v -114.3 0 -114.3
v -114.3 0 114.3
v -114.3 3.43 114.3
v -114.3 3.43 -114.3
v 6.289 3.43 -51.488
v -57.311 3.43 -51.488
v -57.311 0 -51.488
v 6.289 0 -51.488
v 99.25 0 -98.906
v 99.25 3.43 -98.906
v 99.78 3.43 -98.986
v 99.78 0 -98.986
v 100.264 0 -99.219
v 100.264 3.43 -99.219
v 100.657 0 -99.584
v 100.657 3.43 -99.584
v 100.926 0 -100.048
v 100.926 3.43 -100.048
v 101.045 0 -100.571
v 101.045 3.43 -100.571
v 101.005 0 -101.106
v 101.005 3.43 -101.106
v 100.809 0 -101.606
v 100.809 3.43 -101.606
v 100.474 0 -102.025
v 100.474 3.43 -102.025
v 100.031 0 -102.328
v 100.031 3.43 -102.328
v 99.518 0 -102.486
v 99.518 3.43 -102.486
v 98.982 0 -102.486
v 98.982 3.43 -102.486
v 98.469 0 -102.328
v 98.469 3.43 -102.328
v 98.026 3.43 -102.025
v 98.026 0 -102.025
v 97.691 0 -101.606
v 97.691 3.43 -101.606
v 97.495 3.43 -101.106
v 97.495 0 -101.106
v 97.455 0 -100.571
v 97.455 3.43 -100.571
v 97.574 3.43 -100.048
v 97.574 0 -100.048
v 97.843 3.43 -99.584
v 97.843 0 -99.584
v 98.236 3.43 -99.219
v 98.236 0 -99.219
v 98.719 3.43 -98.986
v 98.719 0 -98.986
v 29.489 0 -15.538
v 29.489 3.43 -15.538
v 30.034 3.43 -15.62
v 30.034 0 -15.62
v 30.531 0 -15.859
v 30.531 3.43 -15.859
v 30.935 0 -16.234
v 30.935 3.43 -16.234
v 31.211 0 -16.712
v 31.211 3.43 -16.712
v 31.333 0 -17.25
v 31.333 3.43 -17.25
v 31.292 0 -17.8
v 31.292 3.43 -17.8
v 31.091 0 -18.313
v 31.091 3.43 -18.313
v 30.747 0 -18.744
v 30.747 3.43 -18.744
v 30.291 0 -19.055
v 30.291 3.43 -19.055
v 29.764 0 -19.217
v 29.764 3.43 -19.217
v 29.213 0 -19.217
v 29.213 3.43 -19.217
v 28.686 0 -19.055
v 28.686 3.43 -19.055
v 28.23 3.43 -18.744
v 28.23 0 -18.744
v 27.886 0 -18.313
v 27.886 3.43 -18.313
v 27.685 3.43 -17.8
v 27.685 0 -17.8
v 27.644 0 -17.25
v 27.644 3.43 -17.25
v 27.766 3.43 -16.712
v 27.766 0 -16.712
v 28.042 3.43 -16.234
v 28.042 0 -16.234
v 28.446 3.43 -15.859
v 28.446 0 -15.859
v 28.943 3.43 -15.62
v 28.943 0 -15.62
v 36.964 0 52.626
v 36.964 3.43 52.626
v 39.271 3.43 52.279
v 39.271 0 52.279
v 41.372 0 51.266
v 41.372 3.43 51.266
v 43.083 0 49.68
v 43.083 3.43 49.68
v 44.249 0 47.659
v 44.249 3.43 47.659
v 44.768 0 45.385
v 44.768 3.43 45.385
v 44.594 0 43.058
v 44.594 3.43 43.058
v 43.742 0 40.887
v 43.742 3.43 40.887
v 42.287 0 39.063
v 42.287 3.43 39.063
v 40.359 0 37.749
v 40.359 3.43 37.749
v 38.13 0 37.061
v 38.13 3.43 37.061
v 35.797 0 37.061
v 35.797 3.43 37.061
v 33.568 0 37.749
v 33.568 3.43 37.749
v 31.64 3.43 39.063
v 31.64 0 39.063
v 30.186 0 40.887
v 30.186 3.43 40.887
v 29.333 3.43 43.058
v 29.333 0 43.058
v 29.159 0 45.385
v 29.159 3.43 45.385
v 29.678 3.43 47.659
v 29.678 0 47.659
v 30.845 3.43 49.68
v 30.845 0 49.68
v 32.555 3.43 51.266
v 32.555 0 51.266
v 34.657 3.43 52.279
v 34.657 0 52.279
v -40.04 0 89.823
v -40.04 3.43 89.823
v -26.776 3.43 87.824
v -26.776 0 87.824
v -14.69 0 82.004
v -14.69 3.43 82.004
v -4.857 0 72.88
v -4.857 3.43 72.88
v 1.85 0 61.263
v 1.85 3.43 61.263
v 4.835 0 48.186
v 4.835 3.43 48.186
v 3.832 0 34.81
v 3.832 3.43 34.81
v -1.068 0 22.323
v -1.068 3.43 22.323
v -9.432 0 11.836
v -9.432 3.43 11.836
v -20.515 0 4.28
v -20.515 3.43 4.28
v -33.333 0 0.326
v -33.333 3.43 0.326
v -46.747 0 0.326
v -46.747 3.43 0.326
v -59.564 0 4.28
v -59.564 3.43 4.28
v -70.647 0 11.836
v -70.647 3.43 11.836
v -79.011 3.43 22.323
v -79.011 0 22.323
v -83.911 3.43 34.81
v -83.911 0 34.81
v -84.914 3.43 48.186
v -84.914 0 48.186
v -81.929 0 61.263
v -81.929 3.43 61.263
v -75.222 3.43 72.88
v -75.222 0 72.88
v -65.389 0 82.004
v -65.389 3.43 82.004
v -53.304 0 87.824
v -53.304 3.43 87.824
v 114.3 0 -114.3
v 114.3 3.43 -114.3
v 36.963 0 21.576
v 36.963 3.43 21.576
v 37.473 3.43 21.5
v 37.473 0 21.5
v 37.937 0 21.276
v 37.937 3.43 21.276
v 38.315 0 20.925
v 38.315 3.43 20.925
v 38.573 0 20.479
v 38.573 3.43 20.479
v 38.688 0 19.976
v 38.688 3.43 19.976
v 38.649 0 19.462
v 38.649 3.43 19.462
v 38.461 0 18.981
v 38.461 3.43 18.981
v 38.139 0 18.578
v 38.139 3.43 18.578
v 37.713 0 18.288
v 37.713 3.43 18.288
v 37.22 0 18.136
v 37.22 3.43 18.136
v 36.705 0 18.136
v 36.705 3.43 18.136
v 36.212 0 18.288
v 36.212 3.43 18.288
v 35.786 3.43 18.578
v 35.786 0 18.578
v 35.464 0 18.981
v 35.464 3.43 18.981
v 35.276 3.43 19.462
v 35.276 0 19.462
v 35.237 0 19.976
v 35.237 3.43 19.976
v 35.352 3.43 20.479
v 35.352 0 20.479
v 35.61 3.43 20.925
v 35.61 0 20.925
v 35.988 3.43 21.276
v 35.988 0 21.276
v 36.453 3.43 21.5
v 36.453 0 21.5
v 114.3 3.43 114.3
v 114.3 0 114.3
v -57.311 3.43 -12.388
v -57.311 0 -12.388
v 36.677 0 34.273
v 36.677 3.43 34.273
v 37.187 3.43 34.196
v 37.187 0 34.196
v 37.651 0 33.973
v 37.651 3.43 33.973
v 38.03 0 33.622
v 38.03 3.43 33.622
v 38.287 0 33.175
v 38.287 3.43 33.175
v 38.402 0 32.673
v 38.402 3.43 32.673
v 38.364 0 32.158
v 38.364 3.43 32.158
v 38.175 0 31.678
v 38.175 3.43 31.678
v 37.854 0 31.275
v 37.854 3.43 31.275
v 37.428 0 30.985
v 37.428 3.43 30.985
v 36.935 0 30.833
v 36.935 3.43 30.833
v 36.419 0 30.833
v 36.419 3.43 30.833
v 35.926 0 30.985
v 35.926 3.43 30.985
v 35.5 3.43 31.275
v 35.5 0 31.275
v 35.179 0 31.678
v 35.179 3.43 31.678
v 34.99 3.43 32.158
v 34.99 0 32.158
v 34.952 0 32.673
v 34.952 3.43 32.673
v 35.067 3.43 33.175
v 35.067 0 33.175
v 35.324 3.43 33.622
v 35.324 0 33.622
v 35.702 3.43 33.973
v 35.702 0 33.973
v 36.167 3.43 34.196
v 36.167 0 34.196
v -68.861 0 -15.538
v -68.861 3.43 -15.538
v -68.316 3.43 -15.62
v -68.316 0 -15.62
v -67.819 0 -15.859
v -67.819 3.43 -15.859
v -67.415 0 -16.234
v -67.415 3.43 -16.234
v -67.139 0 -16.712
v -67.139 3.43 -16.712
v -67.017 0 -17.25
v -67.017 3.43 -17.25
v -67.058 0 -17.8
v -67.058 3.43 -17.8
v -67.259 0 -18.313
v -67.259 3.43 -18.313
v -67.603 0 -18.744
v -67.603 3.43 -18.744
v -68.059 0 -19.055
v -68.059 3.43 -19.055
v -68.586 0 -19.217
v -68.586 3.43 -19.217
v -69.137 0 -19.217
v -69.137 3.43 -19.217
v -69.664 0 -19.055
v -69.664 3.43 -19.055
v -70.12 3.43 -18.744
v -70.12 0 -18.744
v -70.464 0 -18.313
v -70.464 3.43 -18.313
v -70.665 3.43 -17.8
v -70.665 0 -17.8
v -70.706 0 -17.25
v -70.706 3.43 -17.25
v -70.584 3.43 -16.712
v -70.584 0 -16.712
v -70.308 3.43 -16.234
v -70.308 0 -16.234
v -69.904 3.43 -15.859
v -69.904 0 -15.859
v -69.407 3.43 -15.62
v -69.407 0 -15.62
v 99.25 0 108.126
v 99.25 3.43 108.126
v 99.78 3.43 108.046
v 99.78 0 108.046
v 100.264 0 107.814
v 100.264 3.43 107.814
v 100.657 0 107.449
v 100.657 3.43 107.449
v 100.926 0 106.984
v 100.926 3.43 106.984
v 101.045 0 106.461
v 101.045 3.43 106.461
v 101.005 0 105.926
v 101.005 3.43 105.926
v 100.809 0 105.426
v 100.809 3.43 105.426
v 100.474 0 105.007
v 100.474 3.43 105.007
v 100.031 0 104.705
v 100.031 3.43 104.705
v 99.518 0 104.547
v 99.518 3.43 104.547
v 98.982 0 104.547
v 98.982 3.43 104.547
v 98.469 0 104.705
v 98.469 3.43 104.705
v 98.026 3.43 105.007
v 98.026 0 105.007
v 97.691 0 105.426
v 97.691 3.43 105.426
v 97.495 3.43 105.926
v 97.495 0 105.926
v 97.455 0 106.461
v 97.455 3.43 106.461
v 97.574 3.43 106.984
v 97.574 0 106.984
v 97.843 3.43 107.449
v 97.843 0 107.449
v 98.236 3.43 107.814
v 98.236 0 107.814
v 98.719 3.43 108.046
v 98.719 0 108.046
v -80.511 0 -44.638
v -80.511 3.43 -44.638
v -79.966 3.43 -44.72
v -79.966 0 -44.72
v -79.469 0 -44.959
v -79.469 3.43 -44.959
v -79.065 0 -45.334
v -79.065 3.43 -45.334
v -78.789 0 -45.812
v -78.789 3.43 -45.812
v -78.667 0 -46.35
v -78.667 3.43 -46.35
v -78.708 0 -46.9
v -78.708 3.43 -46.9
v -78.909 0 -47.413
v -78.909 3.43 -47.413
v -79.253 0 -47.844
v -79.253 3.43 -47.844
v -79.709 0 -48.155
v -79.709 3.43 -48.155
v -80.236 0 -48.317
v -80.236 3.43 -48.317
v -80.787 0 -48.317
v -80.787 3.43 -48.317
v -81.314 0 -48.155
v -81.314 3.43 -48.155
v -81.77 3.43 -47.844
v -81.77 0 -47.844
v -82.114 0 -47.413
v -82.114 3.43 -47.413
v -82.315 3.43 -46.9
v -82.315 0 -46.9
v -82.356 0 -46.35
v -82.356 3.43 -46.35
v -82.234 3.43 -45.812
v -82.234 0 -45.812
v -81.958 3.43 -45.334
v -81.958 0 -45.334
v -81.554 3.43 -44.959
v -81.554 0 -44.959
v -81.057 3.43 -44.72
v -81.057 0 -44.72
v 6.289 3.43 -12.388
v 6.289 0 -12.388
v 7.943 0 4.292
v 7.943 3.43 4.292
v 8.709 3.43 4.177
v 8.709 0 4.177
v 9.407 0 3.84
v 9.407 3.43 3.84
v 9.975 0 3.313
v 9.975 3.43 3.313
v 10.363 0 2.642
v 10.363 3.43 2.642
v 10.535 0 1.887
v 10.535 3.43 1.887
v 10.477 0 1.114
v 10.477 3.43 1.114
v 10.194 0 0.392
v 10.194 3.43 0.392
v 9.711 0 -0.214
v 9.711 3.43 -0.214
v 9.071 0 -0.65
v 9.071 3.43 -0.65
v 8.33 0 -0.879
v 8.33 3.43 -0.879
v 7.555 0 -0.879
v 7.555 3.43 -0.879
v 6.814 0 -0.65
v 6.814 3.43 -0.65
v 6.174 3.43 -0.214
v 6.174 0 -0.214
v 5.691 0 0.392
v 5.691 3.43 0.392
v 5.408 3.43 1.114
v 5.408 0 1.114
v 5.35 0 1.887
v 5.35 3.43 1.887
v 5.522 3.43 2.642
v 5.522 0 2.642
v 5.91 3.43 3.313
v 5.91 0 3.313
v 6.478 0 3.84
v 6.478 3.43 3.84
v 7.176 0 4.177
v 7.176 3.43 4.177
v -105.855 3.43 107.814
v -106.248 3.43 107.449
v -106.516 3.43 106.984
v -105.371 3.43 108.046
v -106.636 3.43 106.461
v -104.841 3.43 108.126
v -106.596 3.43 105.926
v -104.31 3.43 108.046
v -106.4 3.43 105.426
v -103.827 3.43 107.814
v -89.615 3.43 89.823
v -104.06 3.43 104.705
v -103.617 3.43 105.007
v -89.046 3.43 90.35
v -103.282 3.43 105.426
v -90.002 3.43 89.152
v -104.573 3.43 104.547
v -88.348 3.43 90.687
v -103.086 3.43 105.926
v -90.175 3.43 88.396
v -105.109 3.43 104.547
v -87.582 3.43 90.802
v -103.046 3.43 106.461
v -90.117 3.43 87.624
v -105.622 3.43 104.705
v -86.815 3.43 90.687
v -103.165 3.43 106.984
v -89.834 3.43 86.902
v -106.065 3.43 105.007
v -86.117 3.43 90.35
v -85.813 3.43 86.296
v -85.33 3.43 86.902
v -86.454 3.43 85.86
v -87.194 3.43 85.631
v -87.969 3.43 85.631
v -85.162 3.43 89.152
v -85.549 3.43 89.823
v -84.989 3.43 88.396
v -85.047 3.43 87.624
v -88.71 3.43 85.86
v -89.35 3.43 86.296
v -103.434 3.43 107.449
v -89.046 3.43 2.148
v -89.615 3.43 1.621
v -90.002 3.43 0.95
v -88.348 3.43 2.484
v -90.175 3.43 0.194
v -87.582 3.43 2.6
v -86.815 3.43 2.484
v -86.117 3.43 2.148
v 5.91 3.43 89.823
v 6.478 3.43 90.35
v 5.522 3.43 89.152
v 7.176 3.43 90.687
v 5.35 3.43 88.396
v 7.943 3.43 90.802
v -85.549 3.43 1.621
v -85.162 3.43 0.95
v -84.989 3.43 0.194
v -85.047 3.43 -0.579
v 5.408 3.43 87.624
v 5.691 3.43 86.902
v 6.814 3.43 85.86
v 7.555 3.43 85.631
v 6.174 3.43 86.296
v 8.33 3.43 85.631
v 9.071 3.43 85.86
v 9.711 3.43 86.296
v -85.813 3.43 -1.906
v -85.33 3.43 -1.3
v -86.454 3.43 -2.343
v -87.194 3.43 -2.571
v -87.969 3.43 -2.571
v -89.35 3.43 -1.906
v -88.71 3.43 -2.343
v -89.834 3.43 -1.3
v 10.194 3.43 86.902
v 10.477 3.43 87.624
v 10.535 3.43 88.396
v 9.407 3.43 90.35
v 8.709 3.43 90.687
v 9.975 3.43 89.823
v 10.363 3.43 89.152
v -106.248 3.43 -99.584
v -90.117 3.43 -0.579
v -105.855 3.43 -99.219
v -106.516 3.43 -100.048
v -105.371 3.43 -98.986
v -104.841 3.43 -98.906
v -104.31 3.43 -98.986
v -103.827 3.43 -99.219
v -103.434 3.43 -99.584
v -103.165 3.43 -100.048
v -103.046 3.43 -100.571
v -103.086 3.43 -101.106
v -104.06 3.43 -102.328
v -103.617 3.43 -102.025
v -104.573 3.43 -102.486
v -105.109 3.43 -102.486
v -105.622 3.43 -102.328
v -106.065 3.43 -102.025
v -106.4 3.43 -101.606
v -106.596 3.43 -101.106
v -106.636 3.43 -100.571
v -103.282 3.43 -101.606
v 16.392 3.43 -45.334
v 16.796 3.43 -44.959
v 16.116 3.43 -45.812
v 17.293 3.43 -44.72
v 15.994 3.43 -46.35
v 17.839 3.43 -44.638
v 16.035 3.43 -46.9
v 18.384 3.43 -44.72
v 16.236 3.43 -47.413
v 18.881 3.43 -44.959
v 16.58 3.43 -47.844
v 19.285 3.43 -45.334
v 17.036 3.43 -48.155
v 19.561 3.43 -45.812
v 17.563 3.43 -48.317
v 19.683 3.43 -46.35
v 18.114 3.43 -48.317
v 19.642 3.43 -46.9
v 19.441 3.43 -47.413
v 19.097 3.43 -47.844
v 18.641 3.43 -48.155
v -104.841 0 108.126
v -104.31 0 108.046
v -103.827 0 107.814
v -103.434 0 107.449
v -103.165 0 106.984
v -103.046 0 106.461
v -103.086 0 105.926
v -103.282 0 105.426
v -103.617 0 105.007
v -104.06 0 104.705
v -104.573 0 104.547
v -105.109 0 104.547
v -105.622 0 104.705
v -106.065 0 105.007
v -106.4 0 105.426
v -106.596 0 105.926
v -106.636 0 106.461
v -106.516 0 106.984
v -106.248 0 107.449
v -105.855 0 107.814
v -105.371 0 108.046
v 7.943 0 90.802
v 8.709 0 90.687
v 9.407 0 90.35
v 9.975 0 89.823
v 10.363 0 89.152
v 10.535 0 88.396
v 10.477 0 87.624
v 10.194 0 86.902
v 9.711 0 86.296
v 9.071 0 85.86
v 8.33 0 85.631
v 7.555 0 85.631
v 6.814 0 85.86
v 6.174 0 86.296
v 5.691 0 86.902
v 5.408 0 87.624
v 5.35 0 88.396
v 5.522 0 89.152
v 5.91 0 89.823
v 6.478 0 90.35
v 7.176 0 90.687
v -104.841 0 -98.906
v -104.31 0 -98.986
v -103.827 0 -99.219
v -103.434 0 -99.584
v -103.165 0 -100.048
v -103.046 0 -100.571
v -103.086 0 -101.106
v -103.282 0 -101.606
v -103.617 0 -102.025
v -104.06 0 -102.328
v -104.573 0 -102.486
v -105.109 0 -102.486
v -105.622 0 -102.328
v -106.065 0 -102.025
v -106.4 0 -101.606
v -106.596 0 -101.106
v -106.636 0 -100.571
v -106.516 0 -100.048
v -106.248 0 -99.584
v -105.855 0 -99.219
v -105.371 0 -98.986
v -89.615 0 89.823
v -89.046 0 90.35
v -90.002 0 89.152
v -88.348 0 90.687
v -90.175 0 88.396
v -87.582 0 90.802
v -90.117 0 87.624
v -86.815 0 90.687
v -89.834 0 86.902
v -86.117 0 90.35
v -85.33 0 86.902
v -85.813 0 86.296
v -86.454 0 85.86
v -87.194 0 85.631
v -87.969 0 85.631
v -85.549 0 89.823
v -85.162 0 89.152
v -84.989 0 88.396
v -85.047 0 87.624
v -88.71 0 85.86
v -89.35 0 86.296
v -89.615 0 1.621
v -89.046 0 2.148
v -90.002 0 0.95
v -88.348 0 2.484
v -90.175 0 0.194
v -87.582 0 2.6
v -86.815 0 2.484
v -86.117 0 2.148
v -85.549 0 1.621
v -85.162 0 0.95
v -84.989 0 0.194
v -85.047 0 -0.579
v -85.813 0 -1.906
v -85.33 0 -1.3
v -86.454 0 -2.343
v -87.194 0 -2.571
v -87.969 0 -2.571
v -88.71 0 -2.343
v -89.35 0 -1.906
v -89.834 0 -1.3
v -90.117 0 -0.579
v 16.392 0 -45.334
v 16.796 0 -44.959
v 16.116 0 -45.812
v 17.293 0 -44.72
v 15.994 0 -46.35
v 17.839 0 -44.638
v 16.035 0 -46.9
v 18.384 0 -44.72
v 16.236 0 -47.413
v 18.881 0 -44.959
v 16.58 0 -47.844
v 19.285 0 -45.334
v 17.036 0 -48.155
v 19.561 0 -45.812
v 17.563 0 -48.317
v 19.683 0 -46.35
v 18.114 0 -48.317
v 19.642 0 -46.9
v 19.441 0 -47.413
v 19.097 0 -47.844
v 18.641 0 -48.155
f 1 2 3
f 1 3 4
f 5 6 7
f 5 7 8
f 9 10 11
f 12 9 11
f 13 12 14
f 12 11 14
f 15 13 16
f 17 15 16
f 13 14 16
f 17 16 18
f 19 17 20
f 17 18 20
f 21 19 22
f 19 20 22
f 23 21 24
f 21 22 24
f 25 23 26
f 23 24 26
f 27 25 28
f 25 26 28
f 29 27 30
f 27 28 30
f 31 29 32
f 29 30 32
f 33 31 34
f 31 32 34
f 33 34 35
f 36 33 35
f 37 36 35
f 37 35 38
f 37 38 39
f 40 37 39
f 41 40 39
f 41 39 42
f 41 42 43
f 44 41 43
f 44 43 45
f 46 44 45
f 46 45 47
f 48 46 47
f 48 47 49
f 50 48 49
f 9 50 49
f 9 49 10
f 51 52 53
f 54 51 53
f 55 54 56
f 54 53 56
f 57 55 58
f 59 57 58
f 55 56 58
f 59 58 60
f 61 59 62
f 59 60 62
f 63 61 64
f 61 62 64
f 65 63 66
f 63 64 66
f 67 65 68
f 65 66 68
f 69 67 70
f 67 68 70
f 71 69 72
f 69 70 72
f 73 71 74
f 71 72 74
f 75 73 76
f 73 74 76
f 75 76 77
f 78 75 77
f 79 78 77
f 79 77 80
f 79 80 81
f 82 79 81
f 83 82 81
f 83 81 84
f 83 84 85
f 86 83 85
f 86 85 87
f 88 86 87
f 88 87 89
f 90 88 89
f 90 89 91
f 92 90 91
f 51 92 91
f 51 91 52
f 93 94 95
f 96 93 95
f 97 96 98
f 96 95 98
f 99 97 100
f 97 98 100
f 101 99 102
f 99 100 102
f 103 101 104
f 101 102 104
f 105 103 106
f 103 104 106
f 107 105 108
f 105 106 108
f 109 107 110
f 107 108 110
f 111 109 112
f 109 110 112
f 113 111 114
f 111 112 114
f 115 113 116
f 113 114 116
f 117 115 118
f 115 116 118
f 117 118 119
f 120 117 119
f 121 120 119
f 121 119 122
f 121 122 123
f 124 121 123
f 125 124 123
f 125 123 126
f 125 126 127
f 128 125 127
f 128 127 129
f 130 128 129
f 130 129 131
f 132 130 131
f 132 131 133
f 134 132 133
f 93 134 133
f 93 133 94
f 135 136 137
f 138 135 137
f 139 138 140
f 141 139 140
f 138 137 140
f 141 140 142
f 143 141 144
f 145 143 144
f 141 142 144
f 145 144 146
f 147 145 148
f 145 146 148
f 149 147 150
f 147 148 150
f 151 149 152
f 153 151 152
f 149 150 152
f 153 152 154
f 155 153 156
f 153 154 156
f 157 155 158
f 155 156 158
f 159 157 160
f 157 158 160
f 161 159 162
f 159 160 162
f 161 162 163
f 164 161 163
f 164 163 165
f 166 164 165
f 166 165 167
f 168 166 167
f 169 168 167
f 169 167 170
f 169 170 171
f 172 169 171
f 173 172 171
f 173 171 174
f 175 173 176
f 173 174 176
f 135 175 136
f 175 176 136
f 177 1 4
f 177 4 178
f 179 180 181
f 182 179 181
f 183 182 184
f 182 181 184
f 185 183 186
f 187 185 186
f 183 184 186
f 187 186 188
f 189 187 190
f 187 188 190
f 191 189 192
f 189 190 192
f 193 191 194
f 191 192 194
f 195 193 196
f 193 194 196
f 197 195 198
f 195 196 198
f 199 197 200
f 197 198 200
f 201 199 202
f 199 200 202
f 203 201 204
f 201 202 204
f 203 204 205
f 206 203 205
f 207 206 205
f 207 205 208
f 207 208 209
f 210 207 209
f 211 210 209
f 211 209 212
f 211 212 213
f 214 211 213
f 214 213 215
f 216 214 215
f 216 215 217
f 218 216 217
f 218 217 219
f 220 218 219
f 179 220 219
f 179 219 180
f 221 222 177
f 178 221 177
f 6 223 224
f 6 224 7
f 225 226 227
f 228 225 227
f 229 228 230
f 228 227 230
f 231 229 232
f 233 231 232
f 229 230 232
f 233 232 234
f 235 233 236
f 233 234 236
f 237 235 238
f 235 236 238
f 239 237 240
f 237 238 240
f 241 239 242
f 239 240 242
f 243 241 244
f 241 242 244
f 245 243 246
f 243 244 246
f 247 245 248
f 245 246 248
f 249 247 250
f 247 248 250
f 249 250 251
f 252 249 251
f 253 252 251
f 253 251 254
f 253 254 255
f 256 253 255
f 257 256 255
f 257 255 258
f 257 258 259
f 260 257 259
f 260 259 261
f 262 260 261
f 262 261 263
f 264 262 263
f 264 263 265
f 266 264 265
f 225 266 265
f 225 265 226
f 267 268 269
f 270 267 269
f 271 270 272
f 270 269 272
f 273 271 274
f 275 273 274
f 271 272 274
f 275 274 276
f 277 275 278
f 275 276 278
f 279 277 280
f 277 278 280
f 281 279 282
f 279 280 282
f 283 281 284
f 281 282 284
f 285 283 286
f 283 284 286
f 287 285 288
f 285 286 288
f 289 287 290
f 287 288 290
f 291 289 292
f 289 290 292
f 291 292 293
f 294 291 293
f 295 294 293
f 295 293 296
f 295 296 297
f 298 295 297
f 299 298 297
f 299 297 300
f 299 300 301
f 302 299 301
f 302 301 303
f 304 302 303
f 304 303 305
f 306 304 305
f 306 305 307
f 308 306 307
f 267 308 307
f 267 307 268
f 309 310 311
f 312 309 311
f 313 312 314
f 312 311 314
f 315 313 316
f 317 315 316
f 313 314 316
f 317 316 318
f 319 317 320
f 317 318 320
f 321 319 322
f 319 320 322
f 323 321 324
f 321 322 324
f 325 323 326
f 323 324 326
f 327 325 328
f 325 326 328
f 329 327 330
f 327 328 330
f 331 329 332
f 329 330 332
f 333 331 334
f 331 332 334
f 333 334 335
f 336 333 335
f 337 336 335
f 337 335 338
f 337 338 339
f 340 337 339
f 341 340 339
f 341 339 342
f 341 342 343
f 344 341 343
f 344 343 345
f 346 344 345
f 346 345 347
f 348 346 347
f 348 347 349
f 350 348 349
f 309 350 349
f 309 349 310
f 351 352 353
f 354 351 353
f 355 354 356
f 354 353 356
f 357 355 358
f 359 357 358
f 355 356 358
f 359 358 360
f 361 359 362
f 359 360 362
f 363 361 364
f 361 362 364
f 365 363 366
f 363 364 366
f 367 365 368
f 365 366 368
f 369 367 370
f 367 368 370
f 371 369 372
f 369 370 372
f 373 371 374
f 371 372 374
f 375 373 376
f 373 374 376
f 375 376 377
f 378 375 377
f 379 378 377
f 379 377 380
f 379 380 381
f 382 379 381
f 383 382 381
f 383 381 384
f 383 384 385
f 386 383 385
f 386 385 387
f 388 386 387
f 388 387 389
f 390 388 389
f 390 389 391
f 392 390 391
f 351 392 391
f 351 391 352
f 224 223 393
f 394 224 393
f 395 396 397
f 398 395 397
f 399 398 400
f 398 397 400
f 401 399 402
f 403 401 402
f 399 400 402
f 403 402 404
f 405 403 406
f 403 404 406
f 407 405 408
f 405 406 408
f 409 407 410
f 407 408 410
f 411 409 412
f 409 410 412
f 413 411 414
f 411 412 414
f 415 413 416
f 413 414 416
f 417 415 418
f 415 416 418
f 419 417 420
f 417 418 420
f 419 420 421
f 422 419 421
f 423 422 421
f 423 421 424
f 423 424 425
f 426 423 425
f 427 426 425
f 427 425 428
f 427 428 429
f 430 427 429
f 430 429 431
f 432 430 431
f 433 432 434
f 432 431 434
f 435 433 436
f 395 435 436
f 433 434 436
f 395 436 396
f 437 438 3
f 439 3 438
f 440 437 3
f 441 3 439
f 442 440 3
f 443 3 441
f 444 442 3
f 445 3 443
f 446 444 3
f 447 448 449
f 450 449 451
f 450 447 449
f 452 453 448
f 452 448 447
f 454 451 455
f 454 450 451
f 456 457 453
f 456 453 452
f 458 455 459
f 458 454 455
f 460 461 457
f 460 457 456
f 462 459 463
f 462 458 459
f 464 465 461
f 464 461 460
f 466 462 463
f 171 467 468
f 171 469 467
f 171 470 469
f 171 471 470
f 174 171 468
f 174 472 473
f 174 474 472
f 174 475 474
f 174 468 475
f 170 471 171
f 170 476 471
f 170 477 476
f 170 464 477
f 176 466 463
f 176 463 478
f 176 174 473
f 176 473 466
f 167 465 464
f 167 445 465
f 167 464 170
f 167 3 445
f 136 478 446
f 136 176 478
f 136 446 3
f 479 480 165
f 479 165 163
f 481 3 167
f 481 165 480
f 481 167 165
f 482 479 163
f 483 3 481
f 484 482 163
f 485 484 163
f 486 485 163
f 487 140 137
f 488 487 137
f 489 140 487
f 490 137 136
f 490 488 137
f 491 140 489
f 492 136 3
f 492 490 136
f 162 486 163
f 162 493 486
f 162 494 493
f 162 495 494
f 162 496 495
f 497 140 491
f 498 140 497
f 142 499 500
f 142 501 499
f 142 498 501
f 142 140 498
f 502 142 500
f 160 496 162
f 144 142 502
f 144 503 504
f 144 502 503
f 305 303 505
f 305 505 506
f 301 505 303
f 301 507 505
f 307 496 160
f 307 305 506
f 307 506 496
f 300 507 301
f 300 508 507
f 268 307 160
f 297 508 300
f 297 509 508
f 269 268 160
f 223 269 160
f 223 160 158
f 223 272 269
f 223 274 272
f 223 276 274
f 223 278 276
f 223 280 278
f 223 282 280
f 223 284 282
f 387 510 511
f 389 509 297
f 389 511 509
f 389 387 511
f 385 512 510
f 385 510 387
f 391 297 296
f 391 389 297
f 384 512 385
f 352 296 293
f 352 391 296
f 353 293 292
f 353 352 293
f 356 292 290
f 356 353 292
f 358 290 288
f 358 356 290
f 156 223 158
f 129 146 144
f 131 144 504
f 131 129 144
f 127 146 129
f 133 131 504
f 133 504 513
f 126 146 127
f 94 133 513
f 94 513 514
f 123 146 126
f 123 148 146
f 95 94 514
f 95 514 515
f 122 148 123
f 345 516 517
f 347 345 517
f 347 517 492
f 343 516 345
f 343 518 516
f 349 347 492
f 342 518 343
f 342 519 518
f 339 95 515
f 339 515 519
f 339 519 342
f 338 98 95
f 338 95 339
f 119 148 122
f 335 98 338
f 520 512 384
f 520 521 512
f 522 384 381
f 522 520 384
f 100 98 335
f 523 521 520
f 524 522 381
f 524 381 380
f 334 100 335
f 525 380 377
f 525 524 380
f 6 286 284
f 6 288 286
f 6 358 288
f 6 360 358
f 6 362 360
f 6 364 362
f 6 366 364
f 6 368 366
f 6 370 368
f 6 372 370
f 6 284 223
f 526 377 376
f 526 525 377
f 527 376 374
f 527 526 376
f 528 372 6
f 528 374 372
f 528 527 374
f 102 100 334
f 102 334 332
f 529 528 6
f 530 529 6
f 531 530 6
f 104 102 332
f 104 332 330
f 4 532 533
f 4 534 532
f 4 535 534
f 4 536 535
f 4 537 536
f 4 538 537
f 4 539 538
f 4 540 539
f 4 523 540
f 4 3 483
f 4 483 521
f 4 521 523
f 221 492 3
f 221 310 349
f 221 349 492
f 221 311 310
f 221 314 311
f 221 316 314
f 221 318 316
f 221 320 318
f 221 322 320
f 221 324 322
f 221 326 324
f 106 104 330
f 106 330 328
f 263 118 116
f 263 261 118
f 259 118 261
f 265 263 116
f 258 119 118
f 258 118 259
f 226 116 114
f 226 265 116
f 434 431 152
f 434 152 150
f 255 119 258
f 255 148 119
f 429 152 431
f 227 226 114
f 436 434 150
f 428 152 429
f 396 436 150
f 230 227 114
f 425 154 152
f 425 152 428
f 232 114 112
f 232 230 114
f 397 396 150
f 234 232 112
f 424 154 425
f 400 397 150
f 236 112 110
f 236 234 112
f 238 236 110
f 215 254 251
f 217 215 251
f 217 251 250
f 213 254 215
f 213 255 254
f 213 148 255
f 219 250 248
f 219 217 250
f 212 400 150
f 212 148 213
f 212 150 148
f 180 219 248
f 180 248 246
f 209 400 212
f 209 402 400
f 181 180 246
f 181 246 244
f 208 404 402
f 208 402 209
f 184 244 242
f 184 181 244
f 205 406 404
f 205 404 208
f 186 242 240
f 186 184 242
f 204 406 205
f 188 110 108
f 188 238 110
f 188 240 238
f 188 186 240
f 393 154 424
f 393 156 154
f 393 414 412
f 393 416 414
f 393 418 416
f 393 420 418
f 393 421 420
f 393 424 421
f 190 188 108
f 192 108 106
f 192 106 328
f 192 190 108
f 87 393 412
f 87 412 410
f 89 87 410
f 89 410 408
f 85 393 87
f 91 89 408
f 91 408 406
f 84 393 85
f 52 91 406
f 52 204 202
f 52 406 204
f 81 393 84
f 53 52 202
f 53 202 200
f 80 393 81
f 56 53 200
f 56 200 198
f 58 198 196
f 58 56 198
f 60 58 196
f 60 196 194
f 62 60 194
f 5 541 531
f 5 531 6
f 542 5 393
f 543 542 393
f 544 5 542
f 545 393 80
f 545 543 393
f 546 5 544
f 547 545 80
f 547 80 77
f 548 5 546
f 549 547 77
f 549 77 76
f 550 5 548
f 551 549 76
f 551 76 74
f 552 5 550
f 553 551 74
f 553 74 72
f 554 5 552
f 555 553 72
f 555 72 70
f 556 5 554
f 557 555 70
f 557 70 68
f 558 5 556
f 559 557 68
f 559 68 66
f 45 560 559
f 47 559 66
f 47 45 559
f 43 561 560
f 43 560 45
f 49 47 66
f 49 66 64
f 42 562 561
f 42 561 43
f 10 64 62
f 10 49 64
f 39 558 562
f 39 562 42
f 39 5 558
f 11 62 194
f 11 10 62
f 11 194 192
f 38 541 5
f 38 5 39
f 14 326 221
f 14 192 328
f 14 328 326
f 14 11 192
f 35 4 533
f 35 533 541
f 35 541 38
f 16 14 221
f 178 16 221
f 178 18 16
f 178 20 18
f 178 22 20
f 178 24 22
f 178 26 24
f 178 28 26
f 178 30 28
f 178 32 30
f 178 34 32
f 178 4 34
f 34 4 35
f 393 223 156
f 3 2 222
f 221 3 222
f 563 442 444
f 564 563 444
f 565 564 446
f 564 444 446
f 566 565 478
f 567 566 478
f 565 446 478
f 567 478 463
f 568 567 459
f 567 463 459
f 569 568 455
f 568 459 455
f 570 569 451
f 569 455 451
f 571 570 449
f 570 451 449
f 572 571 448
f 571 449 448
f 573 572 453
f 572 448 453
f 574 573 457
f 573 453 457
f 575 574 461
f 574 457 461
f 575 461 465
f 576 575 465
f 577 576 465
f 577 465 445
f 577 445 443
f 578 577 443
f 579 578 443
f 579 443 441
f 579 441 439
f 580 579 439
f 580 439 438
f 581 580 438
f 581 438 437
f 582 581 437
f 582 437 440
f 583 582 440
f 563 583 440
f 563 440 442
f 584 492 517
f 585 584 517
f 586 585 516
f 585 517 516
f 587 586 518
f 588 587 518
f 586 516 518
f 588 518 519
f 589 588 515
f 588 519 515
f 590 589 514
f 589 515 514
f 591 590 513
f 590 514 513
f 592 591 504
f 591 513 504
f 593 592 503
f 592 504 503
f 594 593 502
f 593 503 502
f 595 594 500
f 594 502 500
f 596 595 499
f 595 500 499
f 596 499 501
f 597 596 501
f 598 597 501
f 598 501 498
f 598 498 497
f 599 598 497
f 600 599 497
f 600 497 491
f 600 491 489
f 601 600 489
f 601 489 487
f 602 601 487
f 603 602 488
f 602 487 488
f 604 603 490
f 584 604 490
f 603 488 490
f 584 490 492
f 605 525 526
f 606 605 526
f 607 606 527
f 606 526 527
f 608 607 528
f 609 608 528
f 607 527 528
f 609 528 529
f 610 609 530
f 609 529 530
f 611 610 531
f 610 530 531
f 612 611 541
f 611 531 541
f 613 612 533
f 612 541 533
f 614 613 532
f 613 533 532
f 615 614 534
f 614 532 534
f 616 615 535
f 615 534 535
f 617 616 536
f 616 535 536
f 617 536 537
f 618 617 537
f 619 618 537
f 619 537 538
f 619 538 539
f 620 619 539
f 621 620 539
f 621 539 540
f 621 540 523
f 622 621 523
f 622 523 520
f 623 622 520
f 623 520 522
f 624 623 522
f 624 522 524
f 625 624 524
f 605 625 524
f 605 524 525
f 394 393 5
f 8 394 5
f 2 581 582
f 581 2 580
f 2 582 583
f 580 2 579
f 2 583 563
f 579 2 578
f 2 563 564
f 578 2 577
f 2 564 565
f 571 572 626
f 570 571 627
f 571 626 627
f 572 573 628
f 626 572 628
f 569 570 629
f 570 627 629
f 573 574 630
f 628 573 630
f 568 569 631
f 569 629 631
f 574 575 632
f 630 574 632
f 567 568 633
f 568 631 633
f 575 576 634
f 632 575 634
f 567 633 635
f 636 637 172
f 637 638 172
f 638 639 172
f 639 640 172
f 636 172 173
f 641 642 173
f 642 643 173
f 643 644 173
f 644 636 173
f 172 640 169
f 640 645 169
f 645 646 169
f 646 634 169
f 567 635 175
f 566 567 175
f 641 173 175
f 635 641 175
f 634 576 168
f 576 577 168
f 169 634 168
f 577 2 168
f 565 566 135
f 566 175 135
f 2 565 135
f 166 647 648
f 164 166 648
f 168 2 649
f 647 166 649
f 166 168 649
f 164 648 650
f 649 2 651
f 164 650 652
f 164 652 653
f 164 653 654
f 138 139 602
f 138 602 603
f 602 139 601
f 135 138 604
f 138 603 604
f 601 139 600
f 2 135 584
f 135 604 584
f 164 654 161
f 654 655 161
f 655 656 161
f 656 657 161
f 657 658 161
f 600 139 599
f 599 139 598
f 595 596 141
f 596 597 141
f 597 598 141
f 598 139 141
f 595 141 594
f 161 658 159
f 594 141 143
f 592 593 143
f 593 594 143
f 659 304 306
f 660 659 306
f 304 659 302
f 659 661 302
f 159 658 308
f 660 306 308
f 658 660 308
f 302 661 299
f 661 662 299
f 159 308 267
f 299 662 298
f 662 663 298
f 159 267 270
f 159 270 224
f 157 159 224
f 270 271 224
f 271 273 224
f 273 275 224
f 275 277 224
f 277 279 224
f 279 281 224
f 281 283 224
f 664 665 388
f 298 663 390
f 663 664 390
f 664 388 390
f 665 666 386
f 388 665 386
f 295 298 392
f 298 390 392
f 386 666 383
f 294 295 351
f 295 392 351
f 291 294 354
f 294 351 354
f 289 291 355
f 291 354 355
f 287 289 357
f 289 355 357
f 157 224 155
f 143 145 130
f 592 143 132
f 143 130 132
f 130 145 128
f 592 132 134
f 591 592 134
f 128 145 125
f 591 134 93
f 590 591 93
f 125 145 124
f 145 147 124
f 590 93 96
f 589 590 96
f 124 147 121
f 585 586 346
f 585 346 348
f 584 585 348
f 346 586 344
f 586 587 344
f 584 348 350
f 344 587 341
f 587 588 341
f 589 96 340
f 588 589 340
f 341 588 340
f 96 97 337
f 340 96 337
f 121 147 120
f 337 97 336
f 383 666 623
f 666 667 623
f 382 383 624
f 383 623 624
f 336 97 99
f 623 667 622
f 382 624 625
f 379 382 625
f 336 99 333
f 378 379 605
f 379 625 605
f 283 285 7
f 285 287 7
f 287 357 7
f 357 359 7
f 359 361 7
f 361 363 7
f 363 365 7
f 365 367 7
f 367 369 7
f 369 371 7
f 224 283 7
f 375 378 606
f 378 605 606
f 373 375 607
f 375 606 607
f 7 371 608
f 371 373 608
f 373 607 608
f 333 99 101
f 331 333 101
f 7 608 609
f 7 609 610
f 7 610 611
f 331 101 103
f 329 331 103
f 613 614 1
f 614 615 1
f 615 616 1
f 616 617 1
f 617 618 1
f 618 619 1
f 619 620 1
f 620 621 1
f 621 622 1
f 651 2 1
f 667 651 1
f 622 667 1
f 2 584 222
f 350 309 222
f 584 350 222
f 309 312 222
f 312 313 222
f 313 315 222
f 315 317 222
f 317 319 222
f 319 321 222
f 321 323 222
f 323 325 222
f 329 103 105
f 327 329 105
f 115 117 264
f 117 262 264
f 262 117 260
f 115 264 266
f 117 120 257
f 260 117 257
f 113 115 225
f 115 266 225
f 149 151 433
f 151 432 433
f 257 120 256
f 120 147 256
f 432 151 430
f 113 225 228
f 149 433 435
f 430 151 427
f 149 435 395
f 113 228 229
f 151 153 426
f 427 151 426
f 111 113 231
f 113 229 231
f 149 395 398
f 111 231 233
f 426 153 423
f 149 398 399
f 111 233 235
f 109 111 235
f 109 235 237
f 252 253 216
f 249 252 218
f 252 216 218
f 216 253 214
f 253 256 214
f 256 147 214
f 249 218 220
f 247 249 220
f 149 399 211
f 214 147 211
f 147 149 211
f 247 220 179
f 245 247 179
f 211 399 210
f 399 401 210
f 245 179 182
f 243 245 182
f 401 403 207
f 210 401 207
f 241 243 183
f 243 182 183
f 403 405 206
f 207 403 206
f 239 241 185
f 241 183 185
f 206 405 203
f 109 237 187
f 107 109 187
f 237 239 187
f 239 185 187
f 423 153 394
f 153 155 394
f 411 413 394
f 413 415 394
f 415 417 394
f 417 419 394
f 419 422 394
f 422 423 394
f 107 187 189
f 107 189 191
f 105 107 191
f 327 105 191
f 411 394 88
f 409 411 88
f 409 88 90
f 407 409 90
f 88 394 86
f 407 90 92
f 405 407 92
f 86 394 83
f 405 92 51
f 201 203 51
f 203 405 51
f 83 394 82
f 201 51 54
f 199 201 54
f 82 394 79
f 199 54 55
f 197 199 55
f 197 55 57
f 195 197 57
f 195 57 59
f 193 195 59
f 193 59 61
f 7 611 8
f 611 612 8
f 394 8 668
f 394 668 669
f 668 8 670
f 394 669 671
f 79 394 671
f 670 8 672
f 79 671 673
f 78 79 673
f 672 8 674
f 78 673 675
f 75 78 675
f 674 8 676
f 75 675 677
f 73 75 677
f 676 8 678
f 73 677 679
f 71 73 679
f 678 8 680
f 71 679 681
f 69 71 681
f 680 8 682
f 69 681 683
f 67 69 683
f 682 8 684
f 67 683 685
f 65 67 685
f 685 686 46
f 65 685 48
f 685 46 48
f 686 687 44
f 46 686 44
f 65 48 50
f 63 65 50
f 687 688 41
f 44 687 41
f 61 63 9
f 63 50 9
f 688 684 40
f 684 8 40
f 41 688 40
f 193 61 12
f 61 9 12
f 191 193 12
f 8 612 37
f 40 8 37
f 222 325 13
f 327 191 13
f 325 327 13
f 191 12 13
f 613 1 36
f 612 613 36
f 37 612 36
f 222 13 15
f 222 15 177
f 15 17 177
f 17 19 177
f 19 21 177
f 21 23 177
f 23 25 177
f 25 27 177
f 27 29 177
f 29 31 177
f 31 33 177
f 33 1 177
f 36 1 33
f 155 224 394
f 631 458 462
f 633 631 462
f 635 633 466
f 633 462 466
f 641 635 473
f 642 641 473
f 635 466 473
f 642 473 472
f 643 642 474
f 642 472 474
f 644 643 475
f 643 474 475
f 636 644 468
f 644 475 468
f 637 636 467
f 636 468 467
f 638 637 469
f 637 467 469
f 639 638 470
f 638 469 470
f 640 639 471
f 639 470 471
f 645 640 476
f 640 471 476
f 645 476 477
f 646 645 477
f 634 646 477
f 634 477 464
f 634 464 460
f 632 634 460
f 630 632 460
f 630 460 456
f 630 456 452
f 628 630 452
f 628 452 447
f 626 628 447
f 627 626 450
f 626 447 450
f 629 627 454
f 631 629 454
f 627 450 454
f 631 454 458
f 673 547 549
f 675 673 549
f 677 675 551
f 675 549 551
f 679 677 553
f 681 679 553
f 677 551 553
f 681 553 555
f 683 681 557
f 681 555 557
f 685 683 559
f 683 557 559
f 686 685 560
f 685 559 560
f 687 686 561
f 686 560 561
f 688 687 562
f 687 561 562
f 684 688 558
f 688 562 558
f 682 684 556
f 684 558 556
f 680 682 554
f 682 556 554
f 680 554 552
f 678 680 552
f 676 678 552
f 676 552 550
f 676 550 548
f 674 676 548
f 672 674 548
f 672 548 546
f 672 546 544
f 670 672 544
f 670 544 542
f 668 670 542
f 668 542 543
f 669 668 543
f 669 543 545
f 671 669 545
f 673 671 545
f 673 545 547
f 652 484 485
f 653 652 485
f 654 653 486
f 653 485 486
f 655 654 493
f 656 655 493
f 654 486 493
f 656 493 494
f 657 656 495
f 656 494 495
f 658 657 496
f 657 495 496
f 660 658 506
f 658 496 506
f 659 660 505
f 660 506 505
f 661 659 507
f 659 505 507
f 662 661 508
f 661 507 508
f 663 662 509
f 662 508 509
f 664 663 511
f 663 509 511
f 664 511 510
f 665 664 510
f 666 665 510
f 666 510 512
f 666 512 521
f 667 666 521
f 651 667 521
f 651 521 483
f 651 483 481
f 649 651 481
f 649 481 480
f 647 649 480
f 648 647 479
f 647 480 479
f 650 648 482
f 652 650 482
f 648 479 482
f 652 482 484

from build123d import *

# Parameters (mm, degrees)
SKETCH2_W           = 228.6
SKETCH2_H           = 228.6
BOSS_EXTRUDE2_DEPTH = 3.43
SKETCH3_R           = 45
CUT_EXTRUDE1_DEPTH  = 3.43
SKETCH4_R           = 2.6
CUT_EXTRUDE2_DEPTH  = 3.43
SKETCH4_3_R         = 2.6
CUT_EXTRUDE3_DEPTH  = 3.43
SKETCH4_4_R         = 2.6
CUT_EXTRUDE4_DEPTH  = 3.43
SKETCH13_W          = 63.6
SKETCH13_H          = 39.1
CUT_EXTRUDE6_DEPTH  = 10
SKETCH21_R          = 1.85
CUT_EXTRUDE11_DEPTH = 10
SKETCH16_R          = 1.8
CUT_EXTRUDE9_DEPTH  = 10
SKETCH17_R          = 1.73
SKETCH17_R_2        = 7.82641692
CUT_EXTRUDE10_DEPTH = 10


with BuildPart() as part:
    # Sketch2 → Boss-Extrude2 (new body)
    with BuildSketch(Plane(origin=(0, 0, 0), x_dir=(1, 0, 0), z_dir=(0, 1, 0))):
        Rectangle(SKETCH2_W, SKETCH2_H)
    extrude(amount=BOSS_EXTRUDE2_DEPTH)

    # Sketch3 → Cut-Extrude1 (cut)
    with BuildSketch(Plane(origin=(0, 3.43, 0), x_dir=(1, 0, 0), z_dir=(0, 1, 0))):
        with Locations((-40.039608825, -44.823101489)):
            Circle(SKETCH3_R)
    extrude(amount=-CUT_EXTRUDE1_DEPTH, mode=Mode.SUBTRACT)

    # Sketch4 → Cut-Extrude2 (cut)
    with BuildSketch(Plane(origin=(0, 3.43, 0), x_dir=(1, 0, 0), z_dir=(0, 1, 0))):
        with Locations((7.942522776, -1.692270962)):
            Circle(SKETCH4_R)
    extrude(amount=-CUT_EXTRUDE2_DEPTH, mode=Mode.SUBTRACT)

    # Sketch4<3> → Cut-Extrude3 (cut)
    with BuildSketch(Plane(origin=(0, 3.43, 0), x_dir=(1, 0, 0), z_dir=(0, 1, 0))):
        with Locations((-87.581844281, 0)):
            Circle(SKETCH4_3_R)
    extrude(amount=-CUT_EXTRUDE3_DEPTH, mode=Mode.SUBTRACT)

    # Sketch4<4> → Cut-Extrude4 (cut)
    with BuildSketch(Plane(origin=(0, 3.43, 0), x_dir=(1, 0, 0), z_dir=(0, 1, 0))):
        with Locations((7.942522776, -88.202101991)):
            Circle(SKETCH4_4_R)
        with Locations((-87.581844281, -88.202101991)):
            Circle(SKETCH4_4_R)
    extrude(amount=-CUT_EXTRUDE4_DEPTH, mode=Mode.SUBTRACT)

    # Sketch13 → Cut-Extrude6 (cut)
    with BuildSketch(Plane(origin=(0, 3.43, 0), x_dir=(1, 0, 0), z_dir=(0, 1, 0))):
        with Locations((-25.511426019, 31.937893032)):
            Rectangle(SKETCH13_W, SKETCH13_H)
    extrude(amount=-CUT_EXTRUDE6_DEPTH, mode=Mode.SUBTRACT)

    # Sketch21 → Cut-Extrude11 (cut)
    with BuildSketch(Plane(origin=(0, 3.43, 0), x_dir=(1, 0, 0), z_dir=(0, 1, 0))):
        with Locations((-80.511426019, 46.487893032)):
            Circle(SKETCH21_R)
        with Locations((-68.861426019, 17.387893032)):
            Circle(SKETCH21_R)
        with Locations((29.488573981, 17.387893032)):
            Circle(SKETCH21_R)
        with Locations((17.838573981, 46.487893032)):
            Circle(SKETCH21_R)
    extrude(amount=-CUT_EXTRUDE11_DEPTH, mode=Mode.SUBTRACT)

    # Sketch16 → Cut-Extrude9 (cut)
    with BuildSketch(Plane(origin=(0, 3.43, 0), x_dir=(1, 0, 0), z_dir=(0, 1, 0))):
        with Locations((99.249935188, -106.326440771)):
            Circle(SKETCH16_R)
        with Locations((99.249935188, 100.705817131)):
            Circle(SKETCH16_R)
        with Locations((-104.840818846, 100.705817131)):
            Circle(SKETCH16_R)
        with Locations((-104.840818846, -106.326440771)):
            Circle(SKETCH16_R)
    extrude(amount=-CUT_EXTRUDE9_DEPTH, mode=Mode.SUBTRACT)

    # Sketch17 → Cut-Extrude10 (cut)
    with BuildSketch(Plane(origin=(0, 3.43, 0), x_dir=(1, 0, 0), z_dir=(0, 1, 0))):
        with Locations((36.96258804, -19.846493577)):
            Circle(SKETCH17_R)
        with Locations((36.676933631, -32.543280633)):
            Circle(SKETCH17_R)
        with Locations((36.963684366, -44.799926749)):
            Circle(SKETCH17_R_2)
    extrude(amount=-CUT_EXTRUDE10_DEPTH, mode=Mode.SUBTRACT)


solid = part.part
